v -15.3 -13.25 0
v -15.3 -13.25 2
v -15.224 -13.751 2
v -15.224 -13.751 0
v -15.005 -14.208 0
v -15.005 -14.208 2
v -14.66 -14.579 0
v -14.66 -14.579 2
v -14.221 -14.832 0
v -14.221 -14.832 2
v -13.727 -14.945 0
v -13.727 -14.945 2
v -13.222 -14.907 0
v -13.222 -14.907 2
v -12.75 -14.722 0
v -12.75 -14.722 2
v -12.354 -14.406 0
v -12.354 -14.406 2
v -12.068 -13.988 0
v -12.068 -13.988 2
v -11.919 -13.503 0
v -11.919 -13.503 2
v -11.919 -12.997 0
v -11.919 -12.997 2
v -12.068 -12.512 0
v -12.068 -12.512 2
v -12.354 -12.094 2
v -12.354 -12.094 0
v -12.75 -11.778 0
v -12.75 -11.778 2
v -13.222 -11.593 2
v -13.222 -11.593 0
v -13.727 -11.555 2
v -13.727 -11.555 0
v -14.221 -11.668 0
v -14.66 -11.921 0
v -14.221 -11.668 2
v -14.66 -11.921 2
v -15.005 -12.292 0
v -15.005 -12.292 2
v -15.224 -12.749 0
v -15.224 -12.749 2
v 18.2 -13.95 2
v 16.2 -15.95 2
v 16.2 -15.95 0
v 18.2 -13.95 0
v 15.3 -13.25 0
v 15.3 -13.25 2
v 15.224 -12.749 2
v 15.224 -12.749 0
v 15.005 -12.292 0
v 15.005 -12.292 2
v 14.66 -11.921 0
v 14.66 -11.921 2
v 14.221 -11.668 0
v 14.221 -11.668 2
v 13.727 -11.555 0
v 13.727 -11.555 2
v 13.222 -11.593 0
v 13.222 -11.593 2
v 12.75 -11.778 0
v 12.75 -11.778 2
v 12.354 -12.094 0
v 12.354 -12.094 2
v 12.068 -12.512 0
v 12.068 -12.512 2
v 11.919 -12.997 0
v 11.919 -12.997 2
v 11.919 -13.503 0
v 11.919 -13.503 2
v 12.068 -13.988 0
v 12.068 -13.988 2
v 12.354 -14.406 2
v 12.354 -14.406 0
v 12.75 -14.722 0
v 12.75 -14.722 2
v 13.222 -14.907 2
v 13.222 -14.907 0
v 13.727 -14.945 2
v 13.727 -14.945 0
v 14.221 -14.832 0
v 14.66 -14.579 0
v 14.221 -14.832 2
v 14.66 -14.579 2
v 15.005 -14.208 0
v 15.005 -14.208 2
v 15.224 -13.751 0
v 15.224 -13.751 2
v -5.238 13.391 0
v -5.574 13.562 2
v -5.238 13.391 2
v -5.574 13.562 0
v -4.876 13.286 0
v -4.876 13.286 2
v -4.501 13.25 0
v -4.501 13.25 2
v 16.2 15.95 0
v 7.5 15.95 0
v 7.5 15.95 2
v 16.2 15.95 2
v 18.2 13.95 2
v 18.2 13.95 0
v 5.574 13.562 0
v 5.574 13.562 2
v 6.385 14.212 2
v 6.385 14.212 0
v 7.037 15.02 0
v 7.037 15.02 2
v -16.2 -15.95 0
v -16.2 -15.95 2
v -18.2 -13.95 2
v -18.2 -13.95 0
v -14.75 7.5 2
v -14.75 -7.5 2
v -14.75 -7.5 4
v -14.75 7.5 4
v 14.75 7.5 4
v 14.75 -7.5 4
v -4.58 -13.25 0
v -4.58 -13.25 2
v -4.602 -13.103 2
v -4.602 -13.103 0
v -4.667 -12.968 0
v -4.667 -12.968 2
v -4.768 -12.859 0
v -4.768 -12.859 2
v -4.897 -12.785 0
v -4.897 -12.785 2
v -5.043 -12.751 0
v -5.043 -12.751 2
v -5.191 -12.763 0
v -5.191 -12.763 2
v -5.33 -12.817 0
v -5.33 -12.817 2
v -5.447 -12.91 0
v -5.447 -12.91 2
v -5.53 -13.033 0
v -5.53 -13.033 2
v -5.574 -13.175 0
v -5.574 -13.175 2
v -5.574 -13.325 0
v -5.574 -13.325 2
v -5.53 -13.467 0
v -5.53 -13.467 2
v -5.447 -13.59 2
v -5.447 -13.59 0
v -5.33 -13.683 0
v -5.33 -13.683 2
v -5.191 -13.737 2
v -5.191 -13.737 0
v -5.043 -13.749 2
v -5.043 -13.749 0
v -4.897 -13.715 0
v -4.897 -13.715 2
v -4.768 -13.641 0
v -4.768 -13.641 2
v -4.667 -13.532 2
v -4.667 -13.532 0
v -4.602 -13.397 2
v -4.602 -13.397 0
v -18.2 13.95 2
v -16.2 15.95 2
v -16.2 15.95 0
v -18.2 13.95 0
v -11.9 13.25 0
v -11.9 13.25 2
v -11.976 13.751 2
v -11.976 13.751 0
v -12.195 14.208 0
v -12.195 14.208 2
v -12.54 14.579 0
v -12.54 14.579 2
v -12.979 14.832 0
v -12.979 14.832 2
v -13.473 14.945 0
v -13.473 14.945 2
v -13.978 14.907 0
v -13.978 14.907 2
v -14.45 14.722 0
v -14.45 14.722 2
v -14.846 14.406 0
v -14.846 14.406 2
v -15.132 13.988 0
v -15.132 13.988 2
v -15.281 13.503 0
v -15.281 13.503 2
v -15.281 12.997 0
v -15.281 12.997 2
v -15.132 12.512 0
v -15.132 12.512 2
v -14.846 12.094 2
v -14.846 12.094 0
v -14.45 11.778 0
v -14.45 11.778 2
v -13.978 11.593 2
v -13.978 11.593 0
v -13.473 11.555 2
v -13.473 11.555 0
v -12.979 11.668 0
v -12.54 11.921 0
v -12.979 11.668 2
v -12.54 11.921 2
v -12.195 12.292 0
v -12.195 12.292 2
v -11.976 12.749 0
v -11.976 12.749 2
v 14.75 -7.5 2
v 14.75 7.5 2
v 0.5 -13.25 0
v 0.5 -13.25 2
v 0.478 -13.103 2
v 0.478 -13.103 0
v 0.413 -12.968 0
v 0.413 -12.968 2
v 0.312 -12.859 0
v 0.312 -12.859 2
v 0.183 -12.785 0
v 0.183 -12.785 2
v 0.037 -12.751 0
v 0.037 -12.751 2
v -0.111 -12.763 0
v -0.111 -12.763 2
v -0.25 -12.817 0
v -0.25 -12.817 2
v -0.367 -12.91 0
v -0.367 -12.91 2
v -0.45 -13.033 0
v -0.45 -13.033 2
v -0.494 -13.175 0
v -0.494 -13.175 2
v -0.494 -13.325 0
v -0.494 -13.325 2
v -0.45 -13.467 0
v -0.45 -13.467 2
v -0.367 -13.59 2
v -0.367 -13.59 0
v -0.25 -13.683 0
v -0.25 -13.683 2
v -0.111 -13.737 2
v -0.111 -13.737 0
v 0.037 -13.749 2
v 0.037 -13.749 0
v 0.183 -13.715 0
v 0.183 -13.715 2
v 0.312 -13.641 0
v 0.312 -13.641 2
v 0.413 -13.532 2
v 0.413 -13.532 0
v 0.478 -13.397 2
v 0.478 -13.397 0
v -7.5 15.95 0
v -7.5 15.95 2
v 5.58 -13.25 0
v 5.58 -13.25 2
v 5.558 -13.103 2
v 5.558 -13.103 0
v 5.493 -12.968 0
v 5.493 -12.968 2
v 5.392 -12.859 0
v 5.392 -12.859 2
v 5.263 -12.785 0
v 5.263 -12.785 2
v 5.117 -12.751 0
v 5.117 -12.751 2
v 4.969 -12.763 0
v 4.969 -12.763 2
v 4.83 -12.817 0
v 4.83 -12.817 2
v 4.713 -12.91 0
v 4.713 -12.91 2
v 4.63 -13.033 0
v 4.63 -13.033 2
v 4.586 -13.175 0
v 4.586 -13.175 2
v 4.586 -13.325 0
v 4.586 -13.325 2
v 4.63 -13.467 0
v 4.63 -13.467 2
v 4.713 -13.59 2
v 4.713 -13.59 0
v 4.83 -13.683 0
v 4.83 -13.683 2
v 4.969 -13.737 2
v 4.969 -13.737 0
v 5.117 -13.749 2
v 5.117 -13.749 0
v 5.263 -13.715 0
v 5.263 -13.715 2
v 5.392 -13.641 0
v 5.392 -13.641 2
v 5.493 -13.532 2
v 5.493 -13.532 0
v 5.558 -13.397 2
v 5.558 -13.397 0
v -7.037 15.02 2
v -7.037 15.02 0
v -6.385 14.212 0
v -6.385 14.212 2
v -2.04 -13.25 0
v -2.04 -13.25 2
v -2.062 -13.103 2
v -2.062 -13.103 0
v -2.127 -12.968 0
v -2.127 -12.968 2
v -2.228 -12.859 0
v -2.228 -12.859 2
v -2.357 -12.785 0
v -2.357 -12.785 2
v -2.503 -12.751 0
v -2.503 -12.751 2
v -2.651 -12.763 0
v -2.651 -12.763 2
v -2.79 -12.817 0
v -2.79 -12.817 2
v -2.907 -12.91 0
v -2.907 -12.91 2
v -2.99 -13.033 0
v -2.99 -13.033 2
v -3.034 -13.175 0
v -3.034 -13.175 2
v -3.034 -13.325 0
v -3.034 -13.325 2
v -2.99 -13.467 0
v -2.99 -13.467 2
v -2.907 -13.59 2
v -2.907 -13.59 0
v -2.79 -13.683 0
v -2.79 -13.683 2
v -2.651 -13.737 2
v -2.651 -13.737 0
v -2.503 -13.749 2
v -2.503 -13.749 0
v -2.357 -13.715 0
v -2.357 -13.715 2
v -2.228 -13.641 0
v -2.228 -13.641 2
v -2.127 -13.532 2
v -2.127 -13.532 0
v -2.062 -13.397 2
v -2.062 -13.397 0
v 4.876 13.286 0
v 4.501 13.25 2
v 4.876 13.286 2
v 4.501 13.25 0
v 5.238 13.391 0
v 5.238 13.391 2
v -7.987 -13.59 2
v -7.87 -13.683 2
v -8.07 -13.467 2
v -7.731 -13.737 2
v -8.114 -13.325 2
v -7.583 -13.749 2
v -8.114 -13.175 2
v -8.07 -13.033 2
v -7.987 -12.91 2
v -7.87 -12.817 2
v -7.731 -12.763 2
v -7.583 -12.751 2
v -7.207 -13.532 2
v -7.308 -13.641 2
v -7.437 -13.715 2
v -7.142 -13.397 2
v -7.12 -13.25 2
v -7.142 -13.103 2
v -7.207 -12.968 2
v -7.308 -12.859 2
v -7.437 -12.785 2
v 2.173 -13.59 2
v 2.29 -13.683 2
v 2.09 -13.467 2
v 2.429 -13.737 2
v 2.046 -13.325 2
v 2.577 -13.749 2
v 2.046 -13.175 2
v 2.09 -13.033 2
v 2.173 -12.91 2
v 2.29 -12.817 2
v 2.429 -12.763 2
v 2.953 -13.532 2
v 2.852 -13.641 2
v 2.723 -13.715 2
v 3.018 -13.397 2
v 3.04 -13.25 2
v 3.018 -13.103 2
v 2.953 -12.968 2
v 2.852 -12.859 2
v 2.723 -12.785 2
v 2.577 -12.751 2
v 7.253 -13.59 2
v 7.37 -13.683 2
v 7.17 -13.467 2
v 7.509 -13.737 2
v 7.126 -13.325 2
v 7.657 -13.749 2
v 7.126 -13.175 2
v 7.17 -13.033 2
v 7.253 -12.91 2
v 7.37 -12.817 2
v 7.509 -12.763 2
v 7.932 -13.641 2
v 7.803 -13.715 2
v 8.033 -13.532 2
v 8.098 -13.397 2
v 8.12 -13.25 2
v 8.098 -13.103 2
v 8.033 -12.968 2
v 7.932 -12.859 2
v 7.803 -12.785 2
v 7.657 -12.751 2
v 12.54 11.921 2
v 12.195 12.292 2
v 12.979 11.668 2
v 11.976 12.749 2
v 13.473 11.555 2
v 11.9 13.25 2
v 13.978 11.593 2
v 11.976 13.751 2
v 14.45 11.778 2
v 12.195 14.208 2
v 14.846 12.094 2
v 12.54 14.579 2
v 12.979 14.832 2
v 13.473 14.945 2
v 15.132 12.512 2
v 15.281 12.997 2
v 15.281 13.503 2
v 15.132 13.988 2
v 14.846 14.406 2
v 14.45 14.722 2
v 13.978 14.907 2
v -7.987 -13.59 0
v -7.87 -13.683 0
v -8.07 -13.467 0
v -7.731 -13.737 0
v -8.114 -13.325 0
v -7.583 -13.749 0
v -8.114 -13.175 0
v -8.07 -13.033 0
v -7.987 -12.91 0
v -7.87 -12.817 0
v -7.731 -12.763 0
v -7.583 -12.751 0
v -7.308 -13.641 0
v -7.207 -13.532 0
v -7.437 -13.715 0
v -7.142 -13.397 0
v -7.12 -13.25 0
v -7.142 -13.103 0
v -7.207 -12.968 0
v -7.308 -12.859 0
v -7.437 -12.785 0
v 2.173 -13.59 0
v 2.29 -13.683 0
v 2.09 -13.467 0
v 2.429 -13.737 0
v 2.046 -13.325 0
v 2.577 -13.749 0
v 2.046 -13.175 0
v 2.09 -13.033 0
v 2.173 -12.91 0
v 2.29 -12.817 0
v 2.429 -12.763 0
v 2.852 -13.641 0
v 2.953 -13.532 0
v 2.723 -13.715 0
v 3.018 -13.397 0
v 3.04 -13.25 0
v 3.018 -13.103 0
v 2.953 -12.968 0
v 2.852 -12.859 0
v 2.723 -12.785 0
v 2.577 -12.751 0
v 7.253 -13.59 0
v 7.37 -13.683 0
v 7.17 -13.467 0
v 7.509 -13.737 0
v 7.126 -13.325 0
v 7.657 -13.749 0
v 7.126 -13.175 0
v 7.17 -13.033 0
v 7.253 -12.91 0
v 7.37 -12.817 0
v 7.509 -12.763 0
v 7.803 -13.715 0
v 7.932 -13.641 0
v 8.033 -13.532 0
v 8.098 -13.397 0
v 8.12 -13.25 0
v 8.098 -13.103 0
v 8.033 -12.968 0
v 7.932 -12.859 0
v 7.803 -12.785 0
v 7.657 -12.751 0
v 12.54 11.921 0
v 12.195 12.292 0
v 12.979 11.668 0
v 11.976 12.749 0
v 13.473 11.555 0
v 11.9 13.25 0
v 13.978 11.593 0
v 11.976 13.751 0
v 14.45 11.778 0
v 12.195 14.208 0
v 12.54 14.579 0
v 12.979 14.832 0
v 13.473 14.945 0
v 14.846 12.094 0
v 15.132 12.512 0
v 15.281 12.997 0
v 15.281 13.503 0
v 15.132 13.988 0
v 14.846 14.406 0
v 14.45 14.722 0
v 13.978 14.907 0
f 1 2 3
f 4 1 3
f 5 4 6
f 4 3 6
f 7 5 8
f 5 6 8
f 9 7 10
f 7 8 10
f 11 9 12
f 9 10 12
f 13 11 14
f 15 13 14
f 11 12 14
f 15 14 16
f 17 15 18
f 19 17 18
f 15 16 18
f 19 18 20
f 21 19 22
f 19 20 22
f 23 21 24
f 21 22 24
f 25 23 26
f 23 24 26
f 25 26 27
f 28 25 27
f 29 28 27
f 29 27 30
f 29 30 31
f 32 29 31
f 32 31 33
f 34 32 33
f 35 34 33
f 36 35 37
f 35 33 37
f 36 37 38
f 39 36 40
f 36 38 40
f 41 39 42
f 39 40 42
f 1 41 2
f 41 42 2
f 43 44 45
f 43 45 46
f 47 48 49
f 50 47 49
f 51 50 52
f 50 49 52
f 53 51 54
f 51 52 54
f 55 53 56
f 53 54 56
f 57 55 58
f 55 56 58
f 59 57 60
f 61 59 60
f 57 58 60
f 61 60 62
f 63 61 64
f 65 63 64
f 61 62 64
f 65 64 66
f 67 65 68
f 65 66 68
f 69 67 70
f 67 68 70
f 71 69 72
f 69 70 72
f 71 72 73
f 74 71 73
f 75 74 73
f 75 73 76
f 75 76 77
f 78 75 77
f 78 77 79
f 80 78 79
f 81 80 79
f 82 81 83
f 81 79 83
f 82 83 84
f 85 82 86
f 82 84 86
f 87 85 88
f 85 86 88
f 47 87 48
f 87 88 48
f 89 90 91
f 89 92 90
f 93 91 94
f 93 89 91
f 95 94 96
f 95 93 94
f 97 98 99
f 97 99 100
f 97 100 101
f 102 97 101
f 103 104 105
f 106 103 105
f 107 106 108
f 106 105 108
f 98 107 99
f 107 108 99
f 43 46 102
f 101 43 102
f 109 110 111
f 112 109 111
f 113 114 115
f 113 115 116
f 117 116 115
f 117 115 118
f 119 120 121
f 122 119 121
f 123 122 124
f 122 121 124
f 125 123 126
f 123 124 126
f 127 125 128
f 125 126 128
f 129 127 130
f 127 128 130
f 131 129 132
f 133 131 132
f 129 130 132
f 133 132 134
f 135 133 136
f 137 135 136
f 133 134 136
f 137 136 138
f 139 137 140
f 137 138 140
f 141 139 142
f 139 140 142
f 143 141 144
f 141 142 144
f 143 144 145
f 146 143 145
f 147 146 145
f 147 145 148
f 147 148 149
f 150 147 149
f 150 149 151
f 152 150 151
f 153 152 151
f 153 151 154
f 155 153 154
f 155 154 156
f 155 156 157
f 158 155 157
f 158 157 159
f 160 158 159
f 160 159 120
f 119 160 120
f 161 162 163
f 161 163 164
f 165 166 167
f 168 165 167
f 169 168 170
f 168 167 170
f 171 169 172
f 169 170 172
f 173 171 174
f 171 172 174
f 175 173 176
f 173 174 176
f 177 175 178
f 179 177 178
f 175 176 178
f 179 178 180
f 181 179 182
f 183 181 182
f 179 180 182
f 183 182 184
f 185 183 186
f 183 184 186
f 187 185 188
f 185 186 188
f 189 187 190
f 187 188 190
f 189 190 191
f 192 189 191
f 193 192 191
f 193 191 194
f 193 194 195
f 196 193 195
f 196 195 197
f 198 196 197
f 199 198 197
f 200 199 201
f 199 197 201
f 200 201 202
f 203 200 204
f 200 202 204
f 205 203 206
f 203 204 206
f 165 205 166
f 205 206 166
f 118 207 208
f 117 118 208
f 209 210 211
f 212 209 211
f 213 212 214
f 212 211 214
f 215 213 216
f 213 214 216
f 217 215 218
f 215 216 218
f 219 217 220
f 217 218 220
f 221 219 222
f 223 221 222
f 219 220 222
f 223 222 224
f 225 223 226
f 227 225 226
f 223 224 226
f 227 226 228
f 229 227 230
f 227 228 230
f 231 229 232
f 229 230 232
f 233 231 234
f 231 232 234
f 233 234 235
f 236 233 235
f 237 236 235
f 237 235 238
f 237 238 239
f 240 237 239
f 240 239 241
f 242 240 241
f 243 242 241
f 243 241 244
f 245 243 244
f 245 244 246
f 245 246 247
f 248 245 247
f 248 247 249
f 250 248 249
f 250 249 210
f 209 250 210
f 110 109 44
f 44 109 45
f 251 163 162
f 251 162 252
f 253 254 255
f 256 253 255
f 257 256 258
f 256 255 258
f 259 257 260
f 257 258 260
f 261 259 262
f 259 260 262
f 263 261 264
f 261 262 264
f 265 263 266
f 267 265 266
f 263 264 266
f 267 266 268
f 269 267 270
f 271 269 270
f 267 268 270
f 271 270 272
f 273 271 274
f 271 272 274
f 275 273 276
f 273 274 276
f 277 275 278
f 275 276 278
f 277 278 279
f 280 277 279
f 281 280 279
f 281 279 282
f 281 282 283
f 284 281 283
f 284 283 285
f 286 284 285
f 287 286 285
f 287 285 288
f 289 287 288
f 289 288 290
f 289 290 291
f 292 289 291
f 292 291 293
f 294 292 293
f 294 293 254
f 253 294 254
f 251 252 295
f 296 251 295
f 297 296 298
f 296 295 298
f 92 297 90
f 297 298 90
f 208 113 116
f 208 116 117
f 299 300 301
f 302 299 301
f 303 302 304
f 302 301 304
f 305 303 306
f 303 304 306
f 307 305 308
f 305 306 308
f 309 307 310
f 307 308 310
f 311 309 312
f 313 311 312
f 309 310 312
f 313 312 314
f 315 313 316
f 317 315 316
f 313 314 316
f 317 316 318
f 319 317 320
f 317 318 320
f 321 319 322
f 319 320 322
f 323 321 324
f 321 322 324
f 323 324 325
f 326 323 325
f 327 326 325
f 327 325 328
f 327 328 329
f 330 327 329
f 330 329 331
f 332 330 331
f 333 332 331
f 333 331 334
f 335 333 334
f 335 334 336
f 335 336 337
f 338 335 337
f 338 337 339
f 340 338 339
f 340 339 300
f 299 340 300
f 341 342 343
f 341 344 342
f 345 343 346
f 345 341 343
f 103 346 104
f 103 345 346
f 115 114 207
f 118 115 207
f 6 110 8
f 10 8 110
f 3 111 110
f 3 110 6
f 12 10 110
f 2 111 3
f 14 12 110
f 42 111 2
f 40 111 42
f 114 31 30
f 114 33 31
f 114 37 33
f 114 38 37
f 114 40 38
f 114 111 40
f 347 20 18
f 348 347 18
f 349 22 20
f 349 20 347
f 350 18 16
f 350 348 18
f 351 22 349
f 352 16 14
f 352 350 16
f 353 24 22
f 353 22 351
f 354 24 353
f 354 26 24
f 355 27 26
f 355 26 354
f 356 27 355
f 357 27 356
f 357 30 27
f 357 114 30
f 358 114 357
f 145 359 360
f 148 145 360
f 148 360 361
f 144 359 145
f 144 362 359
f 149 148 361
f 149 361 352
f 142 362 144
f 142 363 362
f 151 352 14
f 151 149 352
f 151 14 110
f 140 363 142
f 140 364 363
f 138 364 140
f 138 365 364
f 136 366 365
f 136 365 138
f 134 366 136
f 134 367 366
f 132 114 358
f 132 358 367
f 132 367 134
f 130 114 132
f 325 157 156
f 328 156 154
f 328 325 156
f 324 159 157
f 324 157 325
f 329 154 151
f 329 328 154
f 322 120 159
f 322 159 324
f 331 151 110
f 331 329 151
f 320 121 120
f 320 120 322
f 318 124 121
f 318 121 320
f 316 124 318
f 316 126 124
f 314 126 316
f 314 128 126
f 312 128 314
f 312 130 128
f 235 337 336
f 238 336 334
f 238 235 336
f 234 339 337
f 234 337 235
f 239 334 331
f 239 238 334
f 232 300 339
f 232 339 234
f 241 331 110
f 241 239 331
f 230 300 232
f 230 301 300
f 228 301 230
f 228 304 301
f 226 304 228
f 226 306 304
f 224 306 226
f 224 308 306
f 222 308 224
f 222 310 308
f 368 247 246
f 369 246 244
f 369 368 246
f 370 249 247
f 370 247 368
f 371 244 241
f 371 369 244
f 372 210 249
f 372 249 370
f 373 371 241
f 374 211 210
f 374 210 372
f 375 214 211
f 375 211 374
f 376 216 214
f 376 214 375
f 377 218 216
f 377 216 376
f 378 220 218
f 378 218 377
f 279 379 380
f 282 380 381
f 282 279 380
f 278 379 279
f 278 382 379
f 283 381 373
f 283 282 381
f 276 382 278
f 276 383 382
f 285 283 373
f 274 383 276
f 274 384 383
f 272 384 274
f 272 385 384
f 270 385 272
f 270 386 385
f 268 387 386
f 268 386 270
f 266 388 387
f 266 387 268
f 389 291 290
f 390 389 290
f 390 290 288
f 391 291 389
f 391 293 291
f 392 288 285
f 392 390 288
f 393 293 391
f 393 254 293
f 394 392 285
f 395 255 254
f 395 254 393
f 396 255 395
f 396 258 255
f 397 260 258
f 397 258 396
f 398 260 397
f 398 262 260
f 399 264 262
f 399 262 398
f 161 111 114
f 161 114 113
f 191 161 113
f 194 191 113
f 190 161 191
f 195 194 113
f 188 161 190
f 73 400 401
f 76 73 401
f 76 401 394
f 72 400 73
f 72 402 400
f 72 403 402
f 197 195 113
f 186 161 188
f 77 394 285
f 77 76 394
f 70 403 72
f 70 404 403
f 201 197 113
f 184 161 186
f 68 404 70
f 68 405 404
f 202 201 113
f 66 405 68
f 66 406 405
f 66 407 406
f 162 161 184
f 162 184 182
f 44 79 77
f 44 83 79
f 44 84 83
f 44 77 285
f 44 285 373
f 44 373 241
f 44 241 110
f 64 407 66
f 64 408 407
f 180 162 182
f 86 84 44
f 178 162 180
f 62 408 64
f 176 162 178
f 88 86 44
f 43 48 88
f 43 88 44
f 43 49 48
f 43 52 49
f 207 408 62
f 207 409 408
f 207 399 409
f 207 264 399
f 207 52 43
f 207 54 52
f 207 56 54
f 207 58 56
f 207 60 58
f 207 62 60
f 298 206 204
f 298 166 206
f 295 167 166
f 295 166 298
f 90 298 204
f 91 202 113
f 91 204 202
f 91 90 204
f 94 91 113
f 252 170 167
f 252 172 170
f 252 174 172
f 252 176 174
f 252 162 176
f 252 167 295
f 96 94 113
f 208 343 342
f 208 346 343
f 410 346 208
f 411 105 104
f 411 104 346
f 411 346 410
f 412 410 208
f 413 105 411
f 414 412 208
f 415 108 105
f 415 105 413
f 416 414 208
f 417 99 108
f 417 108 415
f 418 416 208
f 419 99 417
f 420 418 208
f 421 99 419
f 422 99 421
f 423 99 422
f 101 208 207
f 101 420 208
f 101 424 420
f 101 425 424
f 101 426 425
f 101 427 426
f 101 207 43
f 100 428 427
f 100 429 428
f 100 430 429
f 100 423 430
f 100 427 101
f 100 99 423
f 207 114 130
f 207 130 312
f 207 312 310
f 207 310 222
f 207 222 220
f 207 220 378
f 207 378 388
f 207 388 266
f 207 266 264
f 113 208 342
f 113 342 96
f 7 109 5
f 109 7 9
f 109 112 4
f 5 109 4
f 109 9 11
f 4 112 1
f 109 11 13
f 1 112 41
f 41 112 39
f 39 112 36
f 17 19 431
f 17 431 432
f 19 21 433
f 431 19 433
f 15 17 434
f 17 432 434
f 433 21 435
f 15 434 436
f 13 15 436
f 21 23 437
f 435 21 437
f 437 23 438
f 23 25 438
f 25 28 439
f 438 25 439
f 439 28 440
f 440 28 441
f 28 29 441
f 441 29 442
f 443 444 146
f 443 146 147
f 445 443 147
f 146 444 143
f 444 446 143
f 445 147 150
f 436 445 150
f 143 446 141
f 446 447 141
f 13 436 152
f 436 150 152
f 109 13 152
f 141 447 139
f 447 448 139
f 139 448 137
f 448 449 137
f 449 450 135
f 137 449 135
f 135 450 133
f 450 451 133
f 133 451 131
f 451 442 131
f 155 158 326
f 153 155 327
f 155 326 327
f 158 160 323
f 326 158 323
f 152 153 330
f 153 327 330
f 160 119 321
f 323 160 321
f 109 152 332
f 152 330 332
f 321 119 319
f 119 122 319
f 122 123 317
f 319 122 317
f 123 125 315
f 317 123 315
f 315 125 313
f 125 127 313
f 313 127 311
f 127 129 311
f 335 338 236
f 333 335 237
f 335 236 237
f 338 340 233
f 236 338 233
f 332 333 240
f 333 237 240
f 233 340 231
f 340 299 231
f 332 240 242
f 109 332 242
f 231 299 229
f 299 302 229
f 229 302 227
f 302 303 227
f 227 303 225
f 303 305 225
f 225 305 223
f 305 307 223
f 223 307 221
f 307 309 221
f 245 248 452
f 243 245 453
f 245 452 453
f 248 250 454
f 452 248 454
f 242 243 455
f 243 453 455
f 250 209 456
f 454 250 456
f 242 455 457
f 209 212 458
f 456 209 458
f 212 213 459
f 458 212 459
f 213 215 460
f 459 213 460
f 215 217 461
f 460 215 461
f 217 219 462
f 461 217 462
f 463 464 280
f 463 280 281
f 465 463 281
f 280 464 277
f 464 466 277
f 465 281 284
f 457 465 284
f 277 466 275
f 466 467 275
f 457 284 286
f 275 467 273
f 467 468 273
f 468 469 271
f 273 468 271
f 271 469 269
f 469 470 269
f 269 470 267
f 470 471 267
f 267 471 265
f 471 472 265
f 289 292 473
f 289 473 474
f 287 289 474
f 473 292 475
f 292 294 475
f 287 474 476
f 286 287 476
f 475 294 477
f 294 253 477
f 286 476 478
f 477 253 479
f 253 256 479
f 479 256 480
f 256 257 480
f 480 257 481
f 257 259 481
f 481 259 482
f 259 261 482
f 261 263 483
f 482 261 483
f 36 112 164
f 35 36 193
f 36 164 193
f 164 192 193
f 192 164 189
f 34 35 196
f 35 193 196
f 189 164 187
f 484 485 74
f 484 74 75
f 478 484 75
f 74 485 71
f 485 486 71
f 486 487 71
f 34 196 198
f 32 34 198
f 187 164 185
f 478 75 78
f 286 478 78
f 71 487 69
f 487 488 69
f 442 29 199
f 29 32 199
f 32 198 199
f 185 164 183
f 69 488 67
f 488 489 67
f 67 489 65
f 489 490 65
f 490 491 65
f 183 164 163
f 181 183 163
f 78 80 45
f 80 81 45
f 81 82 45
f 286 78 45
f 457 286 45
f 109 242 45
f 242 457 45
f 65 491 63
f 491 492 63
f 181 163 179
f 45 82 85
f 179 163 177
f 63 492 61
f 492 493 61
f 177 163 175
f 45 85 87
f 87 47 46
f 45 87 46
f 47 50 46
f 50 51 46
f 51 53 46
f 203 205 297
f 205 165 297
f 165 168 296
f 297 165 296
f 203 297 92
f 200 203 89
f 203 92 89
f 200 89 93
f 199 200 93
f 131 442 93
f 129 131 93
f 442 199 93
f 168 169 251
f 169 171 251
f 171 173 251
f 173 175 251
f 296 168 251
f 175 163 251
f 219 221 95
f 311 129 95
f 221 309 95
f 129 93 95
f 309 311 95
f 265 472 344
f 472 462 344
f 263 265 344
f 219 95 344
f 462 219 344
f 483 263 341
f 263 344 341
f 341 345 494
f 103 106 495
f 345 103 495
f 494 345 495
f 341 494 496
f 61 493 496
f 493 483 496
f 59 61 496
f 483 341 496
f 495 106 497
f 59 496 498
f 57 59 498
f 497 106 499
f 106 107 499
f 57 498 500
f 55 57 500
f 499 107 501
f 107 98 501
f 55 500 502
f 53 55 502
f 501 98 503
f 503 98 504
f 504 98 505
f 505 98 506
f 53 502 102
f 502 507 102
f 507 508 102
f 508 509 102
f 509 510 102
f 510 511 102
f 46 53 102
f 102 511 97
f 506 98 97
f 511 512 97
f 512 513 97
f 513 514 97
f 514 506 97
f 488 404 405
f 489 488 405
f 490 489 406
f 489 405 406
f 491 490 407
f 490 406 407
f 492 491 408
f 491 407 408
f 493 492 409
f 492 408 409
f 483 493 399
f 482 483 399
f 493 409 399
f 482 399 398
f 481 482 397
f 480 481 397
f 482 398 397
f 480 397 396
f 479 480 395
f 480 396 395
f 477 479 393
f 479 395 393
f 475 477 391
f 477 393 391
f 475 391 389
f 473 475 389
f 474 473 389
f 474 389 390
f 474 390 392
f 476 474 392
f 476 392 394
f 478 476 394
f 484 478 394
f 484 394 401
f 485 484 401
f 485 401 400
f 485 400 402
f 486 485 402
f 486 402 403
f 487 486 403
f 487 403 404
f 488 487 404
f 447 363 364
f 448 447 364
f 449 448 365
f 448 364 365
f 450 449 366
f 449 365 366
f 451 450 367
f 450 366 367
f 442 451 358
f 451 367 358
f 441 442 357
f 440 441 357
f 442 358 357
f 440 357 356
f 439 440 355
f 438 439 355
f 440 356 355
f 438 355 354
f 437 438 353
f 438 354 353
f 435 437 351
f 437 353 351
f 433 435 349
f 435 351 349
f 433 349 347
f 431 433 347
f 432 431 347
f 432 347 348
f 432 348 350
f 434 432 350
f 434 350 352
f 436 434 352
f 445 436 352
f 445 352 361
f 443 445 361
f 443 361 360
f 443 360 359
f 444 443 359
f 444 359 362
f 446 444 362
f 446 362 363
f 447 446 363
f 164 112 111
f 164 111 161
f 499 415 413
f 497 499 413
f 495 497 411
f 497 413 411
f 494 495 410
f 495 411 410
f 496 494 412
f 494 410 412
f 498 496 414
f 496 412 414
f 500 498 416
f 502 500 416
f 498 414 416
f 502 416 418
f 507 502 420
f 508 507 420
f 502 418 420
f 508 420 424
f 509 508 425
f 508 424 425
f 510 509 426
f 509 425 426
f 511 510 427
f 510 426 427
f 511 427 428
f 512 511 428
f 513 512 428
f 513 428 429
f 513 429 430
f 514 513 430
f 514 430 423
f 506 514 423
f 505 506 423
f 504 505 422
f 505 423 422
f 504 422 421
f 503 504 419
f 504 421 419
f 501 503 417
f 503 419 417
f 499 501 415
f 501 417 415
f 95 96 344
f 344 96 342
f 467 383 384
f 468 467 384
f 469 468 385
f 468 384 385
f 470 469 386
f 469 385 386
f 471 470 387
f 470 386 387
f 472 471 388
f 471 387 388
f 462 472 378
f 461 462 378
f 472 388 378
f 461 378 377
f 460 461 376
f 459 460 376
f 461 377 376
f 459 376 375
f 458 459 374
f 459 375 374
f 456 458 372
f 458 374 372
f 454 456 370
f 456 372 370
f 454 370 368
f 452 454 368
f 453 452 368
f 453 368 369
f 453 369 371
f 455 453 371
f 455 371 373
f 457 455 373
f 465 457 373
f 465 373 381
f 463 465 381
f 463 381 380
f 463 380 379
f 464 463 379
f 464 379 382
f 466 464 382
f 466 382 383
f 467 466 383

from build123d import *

# Parameters (mm, degrees)
SKETCH_1_W          = 36.4
SKETCH_1_H          = 31.9
EXTRUDE_1_DEPTH     = 2
SKETCH_2_W          = 29.5
SKETCH_2_H          = 15
EXTRUDE_2_DEPTH     = 2
SKETCH_3_R          = 1.7
CUT_EXTRUDE_2_DEPTH = 2
CUT_EXTRUDE_3_DEPTH = 2
SKETCH_5_R          = 0.5
CUT_EXTRUDE_4_DEPTH = 30
CUT_EXTRUDE_5_DEPTH = 10
FILLET_1_R          = 2


with BuildPart() as part:
    # 草图1 → 凸台-拉伸1 (new body)
    with BuildSketch(Plane.XY):
        Rectangle(SKETCH_1_W, SKETCH_1_H)
    extrude(amount=EXTRUDE_1_DEPTH)

    # 草图2 → 凸台-拉伸2 (add)
    with BuildSketch(Plane.XY.offset(2)):
        Rectangle(SKETCH_2_W, SKETCH_2_H)
    extrude(amount=EXTRUDE_2_DEPTH)

    # 草图3 → 切除-拉伸2 (cut)
    with BuildSketch(Plane.XY.offset(2)):
        with Locations((-13.6, 13.25)):
            Circle(SKETCH_3_R)
        with Locations(Location((13.6, 13.25, 0), (0, 0, 180))):
            Circle(SKETCH_3_R)
        with Locations((13.6, -13.25)):
            Circle(SKETCH_3_R)
        with Locations(Location((-13.6, -13.25, 0), (0, 0, 180))):
            Circle(SKETCH_3_R)
    extrude(amount=-CUT_EXTRUDE_2_DEPTH, mode=Mode.SUBTRACT)

    # 草图4 → 切除-拉伸3 (cut)
    with BuildSketch(Plane.XY.offset(2)):
        Polygon((-16.2, 15.95), (-18.2, 13.95), (-18.2, 15.95), align=None)
        Polygon((18.2, 13.95), (18.2, 15.95), (16.2, 15.95), align=None)
        Polygon((16.2, -15.95), (18.2, -13.95), (18.2, -15.95), align=None)
        Polygon((-18.2, -13.95), (-18.2, -15.95), (-16.2, -15.95), align=None)
    extrude(amount=-CUT_EXTRUDE_3_DEPTH, mode=Mode.SUBTRACT)

    # 草图5 → 切除-拉伸4 (cut)
    with BuildSketch(Plane.XY.offset(2)):
        with Locations((-7.62, -13.25)):
            Circle(SKETCH_5_R)
        with Locations((-5.08, -13.25)):
            Circle(SKETCH_5_R)
        with Locations((-2.54, -13.25)):
            Circle(SKETCH_5_R)
        with Locations((0, -13.25)):
            Circle(SKETCH_5_R)
        with Locations((2.54, -13.25)):
            Circle(SKETCH_5_R)
        with Locations((5.08, -13.25)):
            Circle(SKETCH_5_R)
        with Locations((7.62, -13.25)):
            Circle(SKETCH_5_R)
    extrude(amount=-CUT_EXTRUDE_4_DEPTH, mode=Mode.SUBTRACT)

    # 草图6 → 切除-拉伸5 (cut)
    with BuildSketch(Plane.XY.offset(2)):
        with BuildLine():
            Line((-5, 13.25), (5, 13.25))
            ThreePointArc((5, 13.25), (6.519232871, 14.350710305), (7.5, 15.95))
            Line((7.5, 15.95), (-7.5, 15.95))
            ThreePointArc((-7.5, 15.95), (-6.519232871, 14.350710305), (-5, 13.25))
        make_face()
    extrude(amount=-CUT_EXTRUDE_5_DEPTH, mode=Mode.SUBTRACT)

    # 圆角1
    fillet_1_edges = [part.edges().sort_by_distance(p)[0] for p in [
        (-5, 13.25, 1),
        (5, 13.25, 1),
    ]]
    fillet(fillet_1_edges, radius=FILLET_1_R)


solid = part.part
